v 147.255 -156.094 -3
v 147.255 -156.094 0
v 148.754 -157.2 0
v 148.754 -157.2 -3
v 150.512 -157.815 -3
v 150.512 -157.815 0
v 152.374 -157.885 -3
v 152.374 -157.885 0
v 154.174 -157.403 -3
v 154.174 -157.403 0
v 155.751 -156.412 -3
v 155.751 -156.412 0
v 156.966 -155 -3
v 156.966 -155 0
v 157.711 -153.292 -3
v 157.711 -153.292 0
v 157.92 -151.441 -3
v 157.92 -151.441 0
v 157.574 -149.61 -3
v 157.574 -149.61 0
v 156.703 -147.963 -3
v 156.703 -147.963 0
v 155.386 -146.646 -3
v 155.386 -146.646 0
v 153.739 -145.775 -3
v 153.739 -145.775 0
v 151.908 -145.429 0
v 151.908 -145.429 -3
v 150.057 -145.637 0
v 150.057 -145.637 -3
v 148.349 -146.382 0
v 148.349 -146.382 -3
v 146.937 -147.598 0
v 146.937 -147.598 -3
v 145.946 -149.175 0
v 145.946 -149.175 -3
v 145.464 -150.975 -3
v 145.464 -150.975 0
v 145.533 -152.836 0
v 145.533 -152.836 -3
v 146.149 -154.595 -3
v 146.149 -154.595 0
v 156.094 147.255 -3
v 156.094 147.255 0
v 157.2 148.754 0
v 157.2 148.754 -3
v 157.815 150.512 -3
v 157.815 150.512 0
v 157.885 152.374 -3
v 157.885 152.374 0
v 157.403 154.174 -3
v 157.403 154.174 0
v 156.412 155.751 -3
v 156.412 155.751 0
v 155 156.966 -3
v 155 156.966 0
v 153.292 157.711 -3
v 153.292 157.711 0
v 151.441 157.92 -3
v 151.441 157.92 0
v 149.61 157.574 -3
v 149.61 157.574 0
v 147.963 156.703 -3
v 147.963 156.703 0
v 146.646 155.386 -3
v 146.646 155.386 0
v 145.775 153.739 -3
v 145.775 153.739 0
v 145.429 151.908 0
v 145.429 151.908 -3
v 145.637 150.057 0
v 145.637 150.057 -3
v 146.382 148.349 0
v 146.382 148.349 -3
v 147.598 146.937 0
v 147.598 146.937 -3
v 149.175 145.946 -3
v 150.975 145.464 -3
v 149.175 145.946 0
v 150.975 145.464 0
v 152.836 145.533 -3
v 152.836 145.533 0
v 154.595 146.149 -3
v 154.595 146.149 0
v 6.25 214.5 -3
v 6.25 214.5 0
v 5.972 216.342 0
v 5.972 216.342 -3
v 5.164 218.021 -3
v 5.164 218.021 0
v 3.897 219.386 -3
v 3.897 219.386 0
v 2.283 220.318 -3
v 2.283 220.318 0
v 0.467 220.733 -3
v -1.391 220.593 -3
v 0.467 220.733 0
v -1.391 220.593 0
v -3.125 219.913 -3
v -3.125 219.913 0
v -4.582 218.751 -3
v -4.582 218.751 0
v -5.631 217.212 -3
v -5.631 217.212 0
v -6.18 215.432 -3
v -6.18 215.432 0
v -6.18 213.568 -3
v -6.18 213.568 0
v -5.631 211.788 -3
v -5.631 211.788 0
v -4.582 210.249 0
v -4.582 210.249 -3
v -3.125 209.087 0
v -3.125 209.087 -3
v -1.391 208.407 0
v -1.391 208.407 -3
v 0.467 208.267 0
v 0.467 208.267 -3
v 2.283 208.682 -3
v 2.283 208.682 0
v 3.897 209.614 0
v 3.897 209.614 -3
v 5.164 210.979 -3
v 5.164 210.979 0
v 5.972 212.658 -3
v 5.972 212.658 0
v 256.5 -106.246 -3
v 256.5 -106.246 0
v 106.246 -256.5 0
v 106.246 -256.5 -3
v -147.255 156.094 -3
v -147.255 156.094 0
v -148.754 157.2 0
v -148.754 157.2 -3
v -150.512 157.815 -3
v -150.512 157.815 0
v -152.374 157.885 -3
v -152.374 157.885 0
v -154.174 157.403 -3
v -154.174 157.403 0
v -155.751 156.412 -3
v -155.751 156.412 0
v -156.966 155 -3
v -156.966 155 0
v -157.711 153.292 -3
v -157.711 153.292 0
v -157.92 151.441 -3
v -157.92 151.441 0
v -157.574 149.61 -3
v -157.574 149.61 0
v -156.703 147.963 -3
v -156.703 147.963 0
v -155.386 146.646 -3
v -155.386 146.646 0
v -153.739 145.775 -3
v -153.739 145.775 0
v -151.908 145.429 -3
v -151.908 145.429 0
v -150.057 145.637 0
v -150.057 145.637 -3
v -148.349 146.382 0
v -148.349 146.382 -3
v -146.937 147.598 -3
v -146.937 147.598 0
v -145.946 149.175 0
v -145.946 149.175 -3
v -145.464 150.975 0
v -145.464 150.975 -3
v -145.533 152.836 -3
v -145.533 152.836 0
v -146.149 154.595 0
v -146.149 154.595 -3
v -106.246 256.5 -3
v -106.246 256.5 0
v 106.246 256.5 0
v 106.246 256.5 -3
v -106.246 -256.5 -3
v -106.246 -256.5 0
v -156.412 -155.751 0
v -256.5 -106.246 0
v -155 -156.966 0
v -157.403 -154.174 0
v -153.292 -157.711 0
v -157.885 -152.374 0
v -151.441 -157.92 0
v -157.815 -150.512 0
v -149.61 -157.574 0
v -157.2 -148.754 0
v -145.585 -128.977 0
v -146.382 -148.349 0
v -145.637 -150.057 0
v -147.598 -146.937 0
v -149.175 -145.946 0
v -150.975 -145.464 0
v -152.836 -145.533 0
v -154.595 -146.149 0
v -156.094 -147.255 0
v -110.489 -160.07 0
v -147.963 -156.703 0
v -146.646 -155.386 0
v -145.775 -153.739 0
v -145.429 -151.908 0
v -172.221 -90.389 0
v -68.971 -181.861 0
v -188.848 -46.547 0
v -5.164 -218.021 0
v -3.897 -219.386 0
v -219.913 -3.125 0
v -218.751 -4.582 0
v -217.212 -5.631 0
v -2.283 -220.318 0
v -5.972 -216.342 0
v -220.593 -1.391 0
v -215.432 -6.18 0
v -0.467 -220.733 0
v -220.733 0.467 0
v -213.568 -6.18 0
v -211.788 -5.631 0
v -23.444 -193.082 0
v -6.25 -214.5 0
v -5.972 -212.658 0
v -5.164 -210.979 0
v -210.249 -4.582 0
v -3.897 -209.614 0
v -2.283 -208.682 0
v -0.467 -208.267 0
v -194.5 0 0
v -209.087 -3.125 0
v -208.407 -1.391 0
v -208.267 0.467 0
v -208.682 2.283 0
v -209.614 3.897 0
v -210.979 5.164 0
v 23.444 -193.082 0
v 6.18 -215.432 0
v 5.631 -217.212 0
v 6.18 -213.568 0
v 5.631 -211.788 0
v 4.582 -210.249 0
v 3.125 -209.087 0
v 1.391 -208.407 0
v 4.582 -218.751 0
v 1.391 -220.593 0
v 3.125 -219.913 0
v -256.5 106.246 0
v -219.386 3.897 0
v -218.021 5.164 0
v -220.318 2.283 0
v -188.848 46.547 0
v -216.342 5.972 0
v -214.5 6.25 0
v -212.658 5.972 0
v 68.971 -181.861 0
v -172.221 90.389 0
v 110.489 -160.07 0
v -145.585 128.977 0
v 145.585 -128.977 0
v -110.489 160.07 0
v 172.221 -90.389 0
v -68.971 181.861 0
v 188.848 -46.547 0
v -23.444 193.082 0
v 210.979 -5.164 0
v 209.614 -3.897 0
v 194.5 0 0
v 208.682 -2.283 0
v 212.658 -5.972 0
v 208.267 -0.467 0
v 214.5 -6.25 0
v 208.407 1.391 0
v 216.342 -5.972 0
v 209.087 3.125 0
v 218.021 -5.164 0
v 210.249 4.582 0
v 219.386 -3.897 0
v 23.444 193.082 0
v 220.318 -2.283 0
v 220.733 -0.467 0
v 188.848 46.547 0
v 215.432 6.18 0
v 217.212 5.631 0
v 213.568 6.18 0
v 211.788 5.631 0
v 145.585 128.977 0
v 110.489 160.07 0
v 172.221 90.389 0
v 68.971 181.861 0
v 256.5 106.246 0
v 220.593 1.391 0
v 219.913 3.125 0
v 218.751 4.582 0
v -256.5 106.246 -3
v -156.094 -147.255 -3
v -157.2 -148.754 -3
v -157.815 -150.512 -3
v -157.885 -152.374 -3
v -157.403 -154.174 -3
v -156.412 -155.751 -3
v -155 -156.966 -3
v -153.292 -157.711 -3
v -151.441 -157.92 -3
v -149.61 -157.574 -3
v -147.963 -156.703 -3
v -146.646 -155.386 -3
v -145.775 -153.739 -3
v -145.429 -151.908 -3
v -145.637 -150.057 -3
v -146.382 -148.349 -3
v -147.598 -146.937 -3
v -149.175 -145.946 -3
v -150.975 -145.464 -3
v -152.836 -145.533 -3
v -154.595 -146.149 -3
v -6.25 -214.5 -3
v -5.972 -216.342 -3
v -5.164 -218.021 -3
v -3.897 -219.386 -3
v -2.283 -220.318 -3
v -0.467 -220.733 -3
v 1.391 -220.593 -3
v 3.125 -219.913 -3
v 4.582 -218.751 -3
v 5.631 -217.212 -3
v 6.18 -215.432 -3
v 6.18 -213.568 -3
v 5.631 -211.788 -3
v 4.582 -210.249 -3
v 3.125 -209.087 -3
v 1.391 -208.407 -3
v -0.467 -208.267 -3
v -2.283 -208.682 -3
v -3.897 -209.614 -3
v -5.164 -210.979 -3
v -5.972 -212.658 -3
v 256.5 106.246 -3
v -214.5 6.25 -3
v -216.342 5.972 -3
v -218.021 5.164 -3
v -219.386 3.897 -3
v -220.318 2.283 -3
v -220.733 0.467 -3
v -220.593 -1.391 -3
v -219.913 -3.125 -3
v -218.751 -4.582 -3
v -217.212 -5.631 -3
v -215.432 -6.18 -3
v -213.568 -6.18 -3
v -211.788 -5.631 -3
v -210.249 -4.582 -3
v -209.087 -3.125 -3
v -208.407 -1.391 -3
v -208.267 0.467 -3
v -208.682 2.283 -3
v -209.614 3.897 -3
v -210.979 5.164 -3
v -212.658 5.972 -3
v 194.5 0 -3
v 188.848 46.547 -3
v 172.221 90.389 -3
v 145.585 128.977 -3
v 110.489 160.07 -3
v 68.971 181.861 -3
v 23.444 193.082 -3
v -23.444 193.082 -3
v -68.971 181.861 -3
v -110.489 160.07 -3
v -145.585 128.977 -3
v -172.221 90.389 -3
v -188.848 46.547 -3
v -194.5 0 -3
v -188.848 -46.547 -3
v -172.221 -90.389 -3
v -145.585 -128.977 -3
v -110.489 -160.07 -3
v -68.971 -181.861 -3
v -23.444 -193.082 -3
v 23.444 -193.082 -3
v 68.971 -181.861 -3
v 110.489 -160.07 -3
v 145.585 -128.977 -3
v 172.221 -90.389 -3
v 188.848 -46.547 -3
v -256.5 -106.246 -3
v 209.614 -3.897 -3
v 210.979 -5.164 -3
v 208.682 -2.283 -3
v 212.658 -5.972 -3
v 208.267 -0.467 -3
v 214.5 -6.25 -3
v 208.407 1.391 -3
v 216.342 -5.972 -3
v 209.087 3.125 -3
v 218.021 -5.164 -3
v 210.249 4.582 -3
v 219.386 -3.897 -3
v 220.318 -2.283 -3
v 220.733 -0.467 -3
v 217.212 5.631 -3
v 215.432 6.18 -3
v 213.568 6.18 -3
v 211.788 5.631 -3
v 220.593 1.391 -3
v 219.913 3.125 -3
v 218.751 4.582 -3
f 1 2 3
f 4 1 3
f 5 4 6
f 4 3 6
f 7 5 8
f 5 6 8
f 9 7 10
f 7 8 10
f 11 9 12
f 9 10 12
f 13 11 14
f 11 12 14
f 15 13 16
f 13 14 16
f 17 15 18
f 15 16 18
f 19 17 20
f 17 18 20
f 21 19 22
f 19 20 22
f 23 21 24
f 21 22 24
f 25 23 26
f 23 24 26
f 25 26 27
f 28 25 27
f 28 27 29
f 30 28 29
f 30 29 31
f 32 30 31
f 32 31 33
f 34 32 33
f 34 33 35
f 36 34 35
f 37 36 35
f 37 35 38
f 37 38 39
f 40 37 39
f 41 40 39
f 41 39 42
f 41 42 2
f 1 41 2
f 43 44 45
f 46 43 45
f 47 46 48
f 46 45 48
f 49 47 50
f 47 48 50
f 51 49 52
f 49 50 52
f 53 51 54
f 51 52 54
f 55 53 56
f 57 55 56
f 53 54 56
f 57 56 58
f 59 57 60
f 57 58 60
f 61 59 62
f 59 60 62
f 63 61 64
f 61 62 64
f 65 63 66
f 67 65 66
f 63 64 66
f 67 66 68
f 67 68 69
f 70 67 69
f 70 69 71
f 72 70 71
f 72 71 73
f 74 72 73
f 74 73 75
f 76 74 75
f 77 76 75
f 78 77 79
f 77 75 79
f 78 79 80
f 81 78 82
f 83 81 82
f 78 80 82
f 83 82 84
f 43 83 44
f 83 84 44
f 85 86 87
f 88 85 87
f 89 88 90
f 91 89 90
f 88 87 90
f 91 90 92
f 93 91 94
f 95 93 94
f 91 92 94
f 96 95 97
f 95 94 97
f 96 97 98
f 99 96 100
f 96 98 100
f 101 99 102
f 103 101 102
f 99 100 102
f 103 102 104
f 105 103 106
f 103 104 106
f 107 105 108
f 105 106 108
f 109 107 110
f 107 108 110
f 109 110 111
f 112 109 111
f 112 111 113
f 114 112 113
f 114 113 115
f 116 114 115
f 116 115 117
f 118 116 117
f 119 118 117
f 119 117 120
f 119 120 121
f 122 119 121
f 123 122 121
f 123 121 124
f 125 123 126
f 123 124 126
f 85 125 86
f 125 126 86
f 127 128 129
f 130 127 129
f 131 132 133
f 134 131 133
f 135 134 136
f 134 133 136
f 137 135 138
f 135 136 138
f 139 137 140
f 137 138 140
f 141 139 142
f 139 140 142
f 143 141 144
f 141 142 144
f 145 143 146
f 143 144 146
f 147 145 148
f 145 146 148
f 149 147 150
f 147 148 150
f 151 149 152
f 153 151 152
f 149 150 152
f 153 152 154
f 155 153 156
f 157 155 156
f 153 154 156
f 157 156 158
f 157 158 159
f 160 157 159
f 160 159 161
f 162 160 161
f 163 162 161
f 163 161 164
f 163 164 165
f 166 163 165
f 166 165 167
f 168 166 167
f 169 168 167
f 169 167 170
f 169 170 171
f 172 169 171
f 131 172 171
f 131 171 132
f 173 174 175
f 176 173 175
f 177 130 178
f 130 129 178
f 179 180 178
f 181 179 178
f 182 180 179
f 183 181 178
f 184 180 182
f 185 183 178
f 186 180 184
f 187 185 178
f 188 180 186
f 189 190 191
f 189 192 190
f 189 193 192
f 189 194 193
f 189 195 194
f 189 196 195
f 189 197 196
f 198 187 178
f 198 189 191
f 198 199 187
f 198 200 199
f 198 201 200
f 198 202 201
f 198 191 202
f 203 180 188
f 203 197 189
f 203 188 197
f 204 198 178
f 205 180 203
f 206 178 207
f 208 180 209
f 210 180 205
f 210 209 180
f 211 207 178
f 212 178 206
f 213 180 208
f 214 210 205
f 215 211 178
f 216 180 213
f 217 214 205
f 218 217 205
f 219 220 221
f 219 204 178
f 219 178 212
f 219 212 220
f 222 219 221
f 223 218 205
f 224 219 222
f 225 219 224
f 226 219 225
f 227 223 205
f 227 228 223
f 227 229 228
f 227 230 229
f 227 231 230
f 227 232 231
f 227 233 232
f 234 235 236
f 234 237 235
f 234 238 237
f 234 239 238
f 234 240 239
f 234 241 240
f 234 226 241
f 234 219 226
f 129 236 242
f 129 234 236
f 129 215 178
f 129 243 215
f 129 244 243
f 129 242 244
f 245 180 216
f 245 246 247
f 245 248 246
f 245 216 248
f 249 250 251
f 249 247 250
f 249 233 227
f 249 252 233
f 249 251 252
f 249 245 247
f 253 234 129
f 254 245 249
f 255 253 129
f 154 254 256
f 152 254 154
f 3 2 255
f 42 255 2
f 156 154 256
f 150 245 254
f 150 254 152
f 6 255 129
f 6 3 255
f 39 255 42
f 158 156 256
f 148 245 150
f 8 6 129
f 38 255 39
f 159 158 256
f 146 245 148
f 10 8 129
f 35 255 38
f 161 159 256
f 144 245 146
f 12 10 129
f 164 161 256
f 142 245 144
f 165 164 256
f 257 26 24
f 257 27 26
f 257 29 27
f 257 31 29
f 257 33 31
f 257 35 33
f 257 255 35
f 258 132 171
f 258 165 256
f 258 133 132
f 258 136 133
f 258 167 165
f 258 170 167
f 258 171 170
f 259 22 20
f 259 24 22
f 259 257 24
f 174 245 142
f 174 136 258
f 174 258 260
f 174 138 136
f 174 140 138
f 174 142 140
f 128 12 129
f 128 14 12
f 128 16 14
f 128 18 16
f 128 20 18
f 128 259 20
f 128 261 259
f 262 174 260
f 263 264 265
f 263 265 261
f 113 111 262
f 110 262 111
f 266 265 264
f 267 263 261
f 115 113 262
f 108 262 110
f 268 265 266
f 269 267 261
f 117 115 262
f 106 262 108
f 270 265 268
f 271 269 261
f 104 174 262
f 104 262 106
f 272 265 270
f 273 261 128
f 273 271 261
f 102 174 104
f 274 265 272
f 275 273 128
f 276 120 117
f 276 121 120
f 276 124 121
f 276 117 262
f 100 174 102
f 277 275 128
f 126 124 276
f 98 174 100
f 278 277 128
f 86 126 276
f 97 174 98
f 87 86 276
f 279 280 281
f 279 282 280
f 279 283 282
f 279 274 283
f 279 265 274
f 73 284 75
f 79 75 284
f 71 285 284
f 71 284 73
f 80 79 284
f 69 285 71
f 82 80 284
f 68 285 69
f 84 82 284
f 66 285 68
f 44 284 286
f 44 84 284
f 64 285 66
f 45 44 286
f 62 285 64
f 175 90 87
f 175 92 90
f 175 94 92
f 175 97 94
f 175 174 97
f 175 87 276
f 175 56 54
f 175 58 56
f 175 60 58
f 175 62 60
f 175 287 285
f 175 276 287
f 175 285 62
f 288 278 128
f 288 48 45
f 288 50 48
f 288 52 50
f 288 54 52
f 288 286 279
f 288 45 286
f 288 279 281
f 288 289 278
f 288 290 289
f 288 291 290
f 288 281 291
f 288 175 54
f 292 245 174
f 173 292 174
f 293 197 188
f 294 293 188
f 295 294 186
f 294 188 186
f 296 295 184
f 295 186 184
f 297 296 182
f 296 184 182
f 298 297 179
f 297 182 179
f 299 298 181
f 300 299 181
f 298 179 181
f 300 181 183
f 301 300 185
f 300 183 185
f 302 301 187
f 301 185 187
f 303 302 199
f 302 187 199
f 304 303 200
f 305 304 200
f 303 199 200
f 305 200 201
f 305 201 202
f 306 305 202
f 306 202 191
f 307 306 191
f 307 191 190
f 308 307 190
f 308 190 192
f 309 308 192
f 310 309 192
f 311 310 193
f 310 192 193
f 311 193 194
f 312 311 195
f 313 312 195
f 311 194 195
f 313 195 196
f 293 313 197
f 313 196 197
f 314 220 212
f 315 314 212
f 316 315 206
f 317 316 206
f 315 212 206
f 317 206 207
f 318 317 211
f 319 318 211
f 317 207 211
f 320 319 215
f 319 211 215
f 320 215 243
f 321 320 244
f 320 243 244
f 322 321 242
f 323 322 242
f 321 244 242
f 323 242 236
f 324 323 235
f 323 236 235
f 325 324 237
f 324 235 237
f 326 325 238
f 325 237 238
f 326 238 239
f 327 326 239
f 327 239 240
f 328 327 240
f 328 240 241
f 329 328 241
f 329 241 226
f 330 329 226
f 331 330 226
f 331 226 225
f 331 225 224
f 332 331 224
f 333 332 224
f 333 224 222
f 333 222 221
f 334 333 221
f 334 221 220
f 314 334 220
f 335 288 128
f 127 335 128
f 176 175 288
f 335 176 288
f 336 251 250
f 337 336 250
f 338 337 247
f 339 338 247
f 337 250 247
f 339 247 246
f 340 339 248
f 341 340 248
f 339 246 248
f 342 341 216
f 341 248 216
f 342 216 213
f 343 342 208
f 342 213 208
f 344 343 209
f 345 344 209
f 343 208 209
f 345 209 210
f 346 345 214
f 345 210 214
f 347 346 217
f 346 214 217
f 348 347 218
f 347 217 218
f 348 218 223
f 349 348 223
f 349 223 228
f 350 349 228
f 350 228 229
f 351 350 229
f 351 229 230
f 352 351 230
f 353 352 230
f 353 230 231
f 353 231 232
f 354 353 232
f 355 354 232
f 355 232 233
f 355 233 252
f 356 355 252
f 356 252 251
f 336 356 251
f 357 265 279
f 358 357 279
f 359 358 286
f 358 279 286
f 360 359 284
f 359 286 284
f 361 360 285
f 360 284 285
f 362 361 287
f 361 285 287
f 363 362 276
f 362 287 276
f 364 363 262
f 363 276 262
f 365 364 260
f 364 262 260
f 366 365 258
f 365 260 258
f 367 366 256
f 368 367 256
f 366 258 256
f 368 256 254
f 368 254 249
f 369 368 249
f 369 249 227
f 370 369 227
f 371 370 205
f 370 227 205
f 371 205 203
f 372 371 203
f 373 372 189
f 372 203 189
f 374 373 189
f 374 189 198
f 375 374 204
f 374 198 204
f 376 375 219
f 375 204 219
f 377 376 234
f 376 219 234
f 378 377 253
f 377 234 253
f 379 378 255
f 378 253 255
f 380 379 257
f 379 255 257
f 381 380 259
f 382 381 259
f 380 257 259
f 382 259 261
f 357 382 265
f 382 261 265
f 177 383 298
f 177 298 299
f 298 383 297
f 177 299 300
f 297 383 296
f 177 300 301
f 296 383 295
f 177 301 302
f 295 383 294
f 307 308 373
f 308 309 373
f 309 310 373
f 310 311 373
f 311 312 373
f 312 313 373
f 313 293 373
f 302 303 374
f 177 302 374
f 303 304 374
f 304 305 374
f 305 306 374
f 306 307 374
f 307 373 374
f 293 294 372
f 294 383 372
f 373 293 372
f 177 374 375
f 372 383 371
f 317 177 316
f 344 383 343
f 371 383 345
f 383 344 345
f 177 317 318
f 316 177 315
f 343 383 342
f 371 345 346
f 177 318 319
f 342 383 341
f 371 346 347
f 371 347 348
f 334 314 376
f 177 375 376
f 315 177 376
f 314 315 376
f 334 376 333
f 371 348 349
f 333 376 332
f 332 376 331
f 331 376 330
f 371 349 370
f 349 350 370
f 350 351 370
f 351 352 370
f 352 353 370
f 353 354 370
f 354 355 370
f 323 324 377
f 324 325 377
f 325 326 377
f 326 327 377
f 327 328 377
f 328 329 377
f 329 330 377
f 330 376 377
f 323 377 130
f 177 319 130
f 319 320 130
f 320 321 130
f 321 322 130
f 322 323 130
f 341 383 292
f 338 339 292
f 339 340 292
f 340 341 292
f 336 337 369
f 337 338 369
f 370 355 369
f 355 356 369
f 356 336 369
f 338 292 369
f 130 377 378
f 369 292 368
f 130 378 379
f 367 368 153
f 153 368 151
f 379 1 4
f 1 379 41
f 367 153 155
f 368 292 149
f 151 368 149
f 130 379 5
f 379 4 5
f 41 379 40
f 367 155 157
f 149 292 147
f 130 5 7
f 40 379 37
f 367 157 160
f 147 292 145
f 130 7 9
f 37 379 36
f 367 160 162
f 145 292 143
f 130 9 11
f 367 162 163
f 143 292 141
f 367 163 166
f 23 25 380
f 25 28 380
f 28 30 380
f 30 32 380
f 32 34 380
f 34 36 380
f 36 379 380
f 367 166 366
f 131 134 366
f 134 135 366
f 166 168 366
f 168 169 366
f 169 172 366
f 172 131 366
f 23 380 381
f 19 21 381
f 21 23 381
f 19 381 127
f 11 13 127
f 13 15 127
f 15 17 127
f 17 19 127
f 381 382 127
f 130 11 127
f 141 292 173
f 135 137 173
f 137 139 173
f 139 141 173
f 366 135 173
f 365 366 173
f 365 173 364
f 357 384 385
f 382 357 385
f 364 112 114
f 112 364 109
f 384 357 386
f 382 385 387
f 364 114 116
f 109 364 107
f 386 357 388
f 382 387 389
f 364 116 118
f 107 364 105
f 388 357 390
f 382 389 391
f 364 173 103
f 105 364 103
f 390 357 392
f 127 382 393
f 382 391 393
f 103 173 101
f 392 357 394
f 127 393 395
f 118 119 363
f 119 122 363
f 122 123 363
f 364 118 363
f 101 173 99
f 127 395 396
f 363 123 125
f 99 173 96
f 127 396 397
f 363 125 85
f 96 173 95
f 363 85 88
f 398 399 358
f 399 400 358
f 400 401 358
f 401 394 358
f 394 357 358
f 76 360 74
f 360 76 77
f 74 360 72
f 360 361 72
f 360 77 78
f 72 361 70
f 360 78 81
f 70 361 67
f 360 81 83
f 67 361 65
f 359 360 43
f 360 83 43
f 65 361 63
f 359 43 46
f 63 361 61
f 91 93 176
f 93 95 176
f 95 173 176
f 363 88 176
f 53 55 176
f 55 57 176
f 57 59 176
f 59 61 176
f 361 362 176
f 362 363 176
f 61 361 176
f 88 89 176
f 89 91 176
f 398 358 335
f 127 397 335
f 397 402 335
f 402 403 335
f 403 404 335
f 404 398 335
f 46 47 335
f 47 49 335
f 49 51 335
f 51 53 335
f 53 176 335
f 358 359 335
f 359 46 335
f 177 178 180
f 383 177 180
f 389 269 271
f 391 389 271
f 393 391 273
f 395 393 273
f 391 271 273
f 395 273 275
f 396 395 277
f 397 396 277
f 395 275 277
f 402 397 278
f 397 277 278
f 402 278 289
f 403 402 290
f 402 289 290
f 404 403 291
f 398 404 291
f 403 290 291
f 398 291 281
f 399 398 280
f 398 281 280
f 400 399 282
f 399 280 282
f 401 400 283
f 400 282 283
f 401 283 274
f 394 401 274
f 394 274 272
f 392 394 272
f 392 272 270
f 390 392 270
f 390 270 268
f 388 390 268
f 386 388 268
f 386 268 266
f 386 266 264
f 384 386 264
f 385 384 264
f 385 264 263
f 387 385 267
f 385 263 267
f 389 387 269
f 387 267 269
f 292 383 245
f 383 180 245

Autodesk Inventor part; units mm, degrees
ref_plane "YZ Plane" through (0, 0, 0) normal (1, 0, 0) x (0, 1, 0)
ref_plane "XZ Plane" through (0, 0, 0) normal (0, 1, 0) x (-1, 0, 0)
ref_plane "XY Plane" through (0, 0, 0) normal (0, 0, 1) x (1, 0, 0)
sketch "Sketch2" plane through (0, 0, 0) normal (0, 0, 1) x (1, 0, 0)
  line L0 (-256.5, 106.2458) -> (-106.2458, 256.5)
  line L1 (-106.2458, 256.5) -> (106.2458, 256.5)
  line L2 (106.2458, 256.5) -> (256.5, 106.2458)
  line L3 (256.5, 106.2458) -> (256.5, -106.2458)
  line L4 (256.5, -106.2458) -> (106.2458, -256.5)
  line L5 (106.2458, -256.5) -> (-106.2458, -256.5)
  line L6 (-106.2458, -256.5) -> (-256.5, -106.2458)
  line L7 (-256.5, -106.2458) -> (-256.5, 106.2458)
  circle A0 centre (0, 0) radius 194.5
  point P0 (0, 256.5)
  dimension "d23" = 513
  dimension "d26" = 389
extrude "Plate1" add sketch "Sketch2" against normal blind 3
sketch "Sketch4" plane through (0, 0, 0) normal (0, 0, 1) x (1, 0, 0)
  circle A0 centre (0, 214.5) radius 6.25
  circle A1 centre (0, 0) radius 194.5 projected
  dimension "d16" = 12.5
  dimension "d17" = 214.5
extrude "Extrusion1" cut sketch "Sketch4" against normal up to surface (3 mm away) contours A0
pattern_circular "Circular Pattern1" count 8 over 360 about axis through (0, 0, -10) along (0, 0, 1) of "Extrusion1"
equation "\"d23\" = Барабан_габарит_по_кассетам"
equation "\"d26\" = Вал_ось_диаметр_КОРМА"
equation "\"d15\" = Thickness"
equation "\"BendRadius\" = Thickness"
equation "\"BendReliefWidth\" = Thickness"
equation "\"BendReliefDepth\" = 0.5 * Thickness"
equation "\"CornerReliefSize\" = 4 * Thickness"
equation "\"MinimumRemnant\" = 2 * Thickness"
equation "\"TransitionRadius\" = BendRadius"
equation "\"JacobiRadiusSize\" = BendRadius"
equation "\"GapSize\" = Thickness"
equation "\"Барабан_габарит_по_кассетам\" = 513"
equation "\"Вал_ось_диаметр_КОРМА\" = 389"
equation "\"Thickness\" = 3"
properties part number "ДМФ 01 22 Барабан торец КОРМА v2.0"
